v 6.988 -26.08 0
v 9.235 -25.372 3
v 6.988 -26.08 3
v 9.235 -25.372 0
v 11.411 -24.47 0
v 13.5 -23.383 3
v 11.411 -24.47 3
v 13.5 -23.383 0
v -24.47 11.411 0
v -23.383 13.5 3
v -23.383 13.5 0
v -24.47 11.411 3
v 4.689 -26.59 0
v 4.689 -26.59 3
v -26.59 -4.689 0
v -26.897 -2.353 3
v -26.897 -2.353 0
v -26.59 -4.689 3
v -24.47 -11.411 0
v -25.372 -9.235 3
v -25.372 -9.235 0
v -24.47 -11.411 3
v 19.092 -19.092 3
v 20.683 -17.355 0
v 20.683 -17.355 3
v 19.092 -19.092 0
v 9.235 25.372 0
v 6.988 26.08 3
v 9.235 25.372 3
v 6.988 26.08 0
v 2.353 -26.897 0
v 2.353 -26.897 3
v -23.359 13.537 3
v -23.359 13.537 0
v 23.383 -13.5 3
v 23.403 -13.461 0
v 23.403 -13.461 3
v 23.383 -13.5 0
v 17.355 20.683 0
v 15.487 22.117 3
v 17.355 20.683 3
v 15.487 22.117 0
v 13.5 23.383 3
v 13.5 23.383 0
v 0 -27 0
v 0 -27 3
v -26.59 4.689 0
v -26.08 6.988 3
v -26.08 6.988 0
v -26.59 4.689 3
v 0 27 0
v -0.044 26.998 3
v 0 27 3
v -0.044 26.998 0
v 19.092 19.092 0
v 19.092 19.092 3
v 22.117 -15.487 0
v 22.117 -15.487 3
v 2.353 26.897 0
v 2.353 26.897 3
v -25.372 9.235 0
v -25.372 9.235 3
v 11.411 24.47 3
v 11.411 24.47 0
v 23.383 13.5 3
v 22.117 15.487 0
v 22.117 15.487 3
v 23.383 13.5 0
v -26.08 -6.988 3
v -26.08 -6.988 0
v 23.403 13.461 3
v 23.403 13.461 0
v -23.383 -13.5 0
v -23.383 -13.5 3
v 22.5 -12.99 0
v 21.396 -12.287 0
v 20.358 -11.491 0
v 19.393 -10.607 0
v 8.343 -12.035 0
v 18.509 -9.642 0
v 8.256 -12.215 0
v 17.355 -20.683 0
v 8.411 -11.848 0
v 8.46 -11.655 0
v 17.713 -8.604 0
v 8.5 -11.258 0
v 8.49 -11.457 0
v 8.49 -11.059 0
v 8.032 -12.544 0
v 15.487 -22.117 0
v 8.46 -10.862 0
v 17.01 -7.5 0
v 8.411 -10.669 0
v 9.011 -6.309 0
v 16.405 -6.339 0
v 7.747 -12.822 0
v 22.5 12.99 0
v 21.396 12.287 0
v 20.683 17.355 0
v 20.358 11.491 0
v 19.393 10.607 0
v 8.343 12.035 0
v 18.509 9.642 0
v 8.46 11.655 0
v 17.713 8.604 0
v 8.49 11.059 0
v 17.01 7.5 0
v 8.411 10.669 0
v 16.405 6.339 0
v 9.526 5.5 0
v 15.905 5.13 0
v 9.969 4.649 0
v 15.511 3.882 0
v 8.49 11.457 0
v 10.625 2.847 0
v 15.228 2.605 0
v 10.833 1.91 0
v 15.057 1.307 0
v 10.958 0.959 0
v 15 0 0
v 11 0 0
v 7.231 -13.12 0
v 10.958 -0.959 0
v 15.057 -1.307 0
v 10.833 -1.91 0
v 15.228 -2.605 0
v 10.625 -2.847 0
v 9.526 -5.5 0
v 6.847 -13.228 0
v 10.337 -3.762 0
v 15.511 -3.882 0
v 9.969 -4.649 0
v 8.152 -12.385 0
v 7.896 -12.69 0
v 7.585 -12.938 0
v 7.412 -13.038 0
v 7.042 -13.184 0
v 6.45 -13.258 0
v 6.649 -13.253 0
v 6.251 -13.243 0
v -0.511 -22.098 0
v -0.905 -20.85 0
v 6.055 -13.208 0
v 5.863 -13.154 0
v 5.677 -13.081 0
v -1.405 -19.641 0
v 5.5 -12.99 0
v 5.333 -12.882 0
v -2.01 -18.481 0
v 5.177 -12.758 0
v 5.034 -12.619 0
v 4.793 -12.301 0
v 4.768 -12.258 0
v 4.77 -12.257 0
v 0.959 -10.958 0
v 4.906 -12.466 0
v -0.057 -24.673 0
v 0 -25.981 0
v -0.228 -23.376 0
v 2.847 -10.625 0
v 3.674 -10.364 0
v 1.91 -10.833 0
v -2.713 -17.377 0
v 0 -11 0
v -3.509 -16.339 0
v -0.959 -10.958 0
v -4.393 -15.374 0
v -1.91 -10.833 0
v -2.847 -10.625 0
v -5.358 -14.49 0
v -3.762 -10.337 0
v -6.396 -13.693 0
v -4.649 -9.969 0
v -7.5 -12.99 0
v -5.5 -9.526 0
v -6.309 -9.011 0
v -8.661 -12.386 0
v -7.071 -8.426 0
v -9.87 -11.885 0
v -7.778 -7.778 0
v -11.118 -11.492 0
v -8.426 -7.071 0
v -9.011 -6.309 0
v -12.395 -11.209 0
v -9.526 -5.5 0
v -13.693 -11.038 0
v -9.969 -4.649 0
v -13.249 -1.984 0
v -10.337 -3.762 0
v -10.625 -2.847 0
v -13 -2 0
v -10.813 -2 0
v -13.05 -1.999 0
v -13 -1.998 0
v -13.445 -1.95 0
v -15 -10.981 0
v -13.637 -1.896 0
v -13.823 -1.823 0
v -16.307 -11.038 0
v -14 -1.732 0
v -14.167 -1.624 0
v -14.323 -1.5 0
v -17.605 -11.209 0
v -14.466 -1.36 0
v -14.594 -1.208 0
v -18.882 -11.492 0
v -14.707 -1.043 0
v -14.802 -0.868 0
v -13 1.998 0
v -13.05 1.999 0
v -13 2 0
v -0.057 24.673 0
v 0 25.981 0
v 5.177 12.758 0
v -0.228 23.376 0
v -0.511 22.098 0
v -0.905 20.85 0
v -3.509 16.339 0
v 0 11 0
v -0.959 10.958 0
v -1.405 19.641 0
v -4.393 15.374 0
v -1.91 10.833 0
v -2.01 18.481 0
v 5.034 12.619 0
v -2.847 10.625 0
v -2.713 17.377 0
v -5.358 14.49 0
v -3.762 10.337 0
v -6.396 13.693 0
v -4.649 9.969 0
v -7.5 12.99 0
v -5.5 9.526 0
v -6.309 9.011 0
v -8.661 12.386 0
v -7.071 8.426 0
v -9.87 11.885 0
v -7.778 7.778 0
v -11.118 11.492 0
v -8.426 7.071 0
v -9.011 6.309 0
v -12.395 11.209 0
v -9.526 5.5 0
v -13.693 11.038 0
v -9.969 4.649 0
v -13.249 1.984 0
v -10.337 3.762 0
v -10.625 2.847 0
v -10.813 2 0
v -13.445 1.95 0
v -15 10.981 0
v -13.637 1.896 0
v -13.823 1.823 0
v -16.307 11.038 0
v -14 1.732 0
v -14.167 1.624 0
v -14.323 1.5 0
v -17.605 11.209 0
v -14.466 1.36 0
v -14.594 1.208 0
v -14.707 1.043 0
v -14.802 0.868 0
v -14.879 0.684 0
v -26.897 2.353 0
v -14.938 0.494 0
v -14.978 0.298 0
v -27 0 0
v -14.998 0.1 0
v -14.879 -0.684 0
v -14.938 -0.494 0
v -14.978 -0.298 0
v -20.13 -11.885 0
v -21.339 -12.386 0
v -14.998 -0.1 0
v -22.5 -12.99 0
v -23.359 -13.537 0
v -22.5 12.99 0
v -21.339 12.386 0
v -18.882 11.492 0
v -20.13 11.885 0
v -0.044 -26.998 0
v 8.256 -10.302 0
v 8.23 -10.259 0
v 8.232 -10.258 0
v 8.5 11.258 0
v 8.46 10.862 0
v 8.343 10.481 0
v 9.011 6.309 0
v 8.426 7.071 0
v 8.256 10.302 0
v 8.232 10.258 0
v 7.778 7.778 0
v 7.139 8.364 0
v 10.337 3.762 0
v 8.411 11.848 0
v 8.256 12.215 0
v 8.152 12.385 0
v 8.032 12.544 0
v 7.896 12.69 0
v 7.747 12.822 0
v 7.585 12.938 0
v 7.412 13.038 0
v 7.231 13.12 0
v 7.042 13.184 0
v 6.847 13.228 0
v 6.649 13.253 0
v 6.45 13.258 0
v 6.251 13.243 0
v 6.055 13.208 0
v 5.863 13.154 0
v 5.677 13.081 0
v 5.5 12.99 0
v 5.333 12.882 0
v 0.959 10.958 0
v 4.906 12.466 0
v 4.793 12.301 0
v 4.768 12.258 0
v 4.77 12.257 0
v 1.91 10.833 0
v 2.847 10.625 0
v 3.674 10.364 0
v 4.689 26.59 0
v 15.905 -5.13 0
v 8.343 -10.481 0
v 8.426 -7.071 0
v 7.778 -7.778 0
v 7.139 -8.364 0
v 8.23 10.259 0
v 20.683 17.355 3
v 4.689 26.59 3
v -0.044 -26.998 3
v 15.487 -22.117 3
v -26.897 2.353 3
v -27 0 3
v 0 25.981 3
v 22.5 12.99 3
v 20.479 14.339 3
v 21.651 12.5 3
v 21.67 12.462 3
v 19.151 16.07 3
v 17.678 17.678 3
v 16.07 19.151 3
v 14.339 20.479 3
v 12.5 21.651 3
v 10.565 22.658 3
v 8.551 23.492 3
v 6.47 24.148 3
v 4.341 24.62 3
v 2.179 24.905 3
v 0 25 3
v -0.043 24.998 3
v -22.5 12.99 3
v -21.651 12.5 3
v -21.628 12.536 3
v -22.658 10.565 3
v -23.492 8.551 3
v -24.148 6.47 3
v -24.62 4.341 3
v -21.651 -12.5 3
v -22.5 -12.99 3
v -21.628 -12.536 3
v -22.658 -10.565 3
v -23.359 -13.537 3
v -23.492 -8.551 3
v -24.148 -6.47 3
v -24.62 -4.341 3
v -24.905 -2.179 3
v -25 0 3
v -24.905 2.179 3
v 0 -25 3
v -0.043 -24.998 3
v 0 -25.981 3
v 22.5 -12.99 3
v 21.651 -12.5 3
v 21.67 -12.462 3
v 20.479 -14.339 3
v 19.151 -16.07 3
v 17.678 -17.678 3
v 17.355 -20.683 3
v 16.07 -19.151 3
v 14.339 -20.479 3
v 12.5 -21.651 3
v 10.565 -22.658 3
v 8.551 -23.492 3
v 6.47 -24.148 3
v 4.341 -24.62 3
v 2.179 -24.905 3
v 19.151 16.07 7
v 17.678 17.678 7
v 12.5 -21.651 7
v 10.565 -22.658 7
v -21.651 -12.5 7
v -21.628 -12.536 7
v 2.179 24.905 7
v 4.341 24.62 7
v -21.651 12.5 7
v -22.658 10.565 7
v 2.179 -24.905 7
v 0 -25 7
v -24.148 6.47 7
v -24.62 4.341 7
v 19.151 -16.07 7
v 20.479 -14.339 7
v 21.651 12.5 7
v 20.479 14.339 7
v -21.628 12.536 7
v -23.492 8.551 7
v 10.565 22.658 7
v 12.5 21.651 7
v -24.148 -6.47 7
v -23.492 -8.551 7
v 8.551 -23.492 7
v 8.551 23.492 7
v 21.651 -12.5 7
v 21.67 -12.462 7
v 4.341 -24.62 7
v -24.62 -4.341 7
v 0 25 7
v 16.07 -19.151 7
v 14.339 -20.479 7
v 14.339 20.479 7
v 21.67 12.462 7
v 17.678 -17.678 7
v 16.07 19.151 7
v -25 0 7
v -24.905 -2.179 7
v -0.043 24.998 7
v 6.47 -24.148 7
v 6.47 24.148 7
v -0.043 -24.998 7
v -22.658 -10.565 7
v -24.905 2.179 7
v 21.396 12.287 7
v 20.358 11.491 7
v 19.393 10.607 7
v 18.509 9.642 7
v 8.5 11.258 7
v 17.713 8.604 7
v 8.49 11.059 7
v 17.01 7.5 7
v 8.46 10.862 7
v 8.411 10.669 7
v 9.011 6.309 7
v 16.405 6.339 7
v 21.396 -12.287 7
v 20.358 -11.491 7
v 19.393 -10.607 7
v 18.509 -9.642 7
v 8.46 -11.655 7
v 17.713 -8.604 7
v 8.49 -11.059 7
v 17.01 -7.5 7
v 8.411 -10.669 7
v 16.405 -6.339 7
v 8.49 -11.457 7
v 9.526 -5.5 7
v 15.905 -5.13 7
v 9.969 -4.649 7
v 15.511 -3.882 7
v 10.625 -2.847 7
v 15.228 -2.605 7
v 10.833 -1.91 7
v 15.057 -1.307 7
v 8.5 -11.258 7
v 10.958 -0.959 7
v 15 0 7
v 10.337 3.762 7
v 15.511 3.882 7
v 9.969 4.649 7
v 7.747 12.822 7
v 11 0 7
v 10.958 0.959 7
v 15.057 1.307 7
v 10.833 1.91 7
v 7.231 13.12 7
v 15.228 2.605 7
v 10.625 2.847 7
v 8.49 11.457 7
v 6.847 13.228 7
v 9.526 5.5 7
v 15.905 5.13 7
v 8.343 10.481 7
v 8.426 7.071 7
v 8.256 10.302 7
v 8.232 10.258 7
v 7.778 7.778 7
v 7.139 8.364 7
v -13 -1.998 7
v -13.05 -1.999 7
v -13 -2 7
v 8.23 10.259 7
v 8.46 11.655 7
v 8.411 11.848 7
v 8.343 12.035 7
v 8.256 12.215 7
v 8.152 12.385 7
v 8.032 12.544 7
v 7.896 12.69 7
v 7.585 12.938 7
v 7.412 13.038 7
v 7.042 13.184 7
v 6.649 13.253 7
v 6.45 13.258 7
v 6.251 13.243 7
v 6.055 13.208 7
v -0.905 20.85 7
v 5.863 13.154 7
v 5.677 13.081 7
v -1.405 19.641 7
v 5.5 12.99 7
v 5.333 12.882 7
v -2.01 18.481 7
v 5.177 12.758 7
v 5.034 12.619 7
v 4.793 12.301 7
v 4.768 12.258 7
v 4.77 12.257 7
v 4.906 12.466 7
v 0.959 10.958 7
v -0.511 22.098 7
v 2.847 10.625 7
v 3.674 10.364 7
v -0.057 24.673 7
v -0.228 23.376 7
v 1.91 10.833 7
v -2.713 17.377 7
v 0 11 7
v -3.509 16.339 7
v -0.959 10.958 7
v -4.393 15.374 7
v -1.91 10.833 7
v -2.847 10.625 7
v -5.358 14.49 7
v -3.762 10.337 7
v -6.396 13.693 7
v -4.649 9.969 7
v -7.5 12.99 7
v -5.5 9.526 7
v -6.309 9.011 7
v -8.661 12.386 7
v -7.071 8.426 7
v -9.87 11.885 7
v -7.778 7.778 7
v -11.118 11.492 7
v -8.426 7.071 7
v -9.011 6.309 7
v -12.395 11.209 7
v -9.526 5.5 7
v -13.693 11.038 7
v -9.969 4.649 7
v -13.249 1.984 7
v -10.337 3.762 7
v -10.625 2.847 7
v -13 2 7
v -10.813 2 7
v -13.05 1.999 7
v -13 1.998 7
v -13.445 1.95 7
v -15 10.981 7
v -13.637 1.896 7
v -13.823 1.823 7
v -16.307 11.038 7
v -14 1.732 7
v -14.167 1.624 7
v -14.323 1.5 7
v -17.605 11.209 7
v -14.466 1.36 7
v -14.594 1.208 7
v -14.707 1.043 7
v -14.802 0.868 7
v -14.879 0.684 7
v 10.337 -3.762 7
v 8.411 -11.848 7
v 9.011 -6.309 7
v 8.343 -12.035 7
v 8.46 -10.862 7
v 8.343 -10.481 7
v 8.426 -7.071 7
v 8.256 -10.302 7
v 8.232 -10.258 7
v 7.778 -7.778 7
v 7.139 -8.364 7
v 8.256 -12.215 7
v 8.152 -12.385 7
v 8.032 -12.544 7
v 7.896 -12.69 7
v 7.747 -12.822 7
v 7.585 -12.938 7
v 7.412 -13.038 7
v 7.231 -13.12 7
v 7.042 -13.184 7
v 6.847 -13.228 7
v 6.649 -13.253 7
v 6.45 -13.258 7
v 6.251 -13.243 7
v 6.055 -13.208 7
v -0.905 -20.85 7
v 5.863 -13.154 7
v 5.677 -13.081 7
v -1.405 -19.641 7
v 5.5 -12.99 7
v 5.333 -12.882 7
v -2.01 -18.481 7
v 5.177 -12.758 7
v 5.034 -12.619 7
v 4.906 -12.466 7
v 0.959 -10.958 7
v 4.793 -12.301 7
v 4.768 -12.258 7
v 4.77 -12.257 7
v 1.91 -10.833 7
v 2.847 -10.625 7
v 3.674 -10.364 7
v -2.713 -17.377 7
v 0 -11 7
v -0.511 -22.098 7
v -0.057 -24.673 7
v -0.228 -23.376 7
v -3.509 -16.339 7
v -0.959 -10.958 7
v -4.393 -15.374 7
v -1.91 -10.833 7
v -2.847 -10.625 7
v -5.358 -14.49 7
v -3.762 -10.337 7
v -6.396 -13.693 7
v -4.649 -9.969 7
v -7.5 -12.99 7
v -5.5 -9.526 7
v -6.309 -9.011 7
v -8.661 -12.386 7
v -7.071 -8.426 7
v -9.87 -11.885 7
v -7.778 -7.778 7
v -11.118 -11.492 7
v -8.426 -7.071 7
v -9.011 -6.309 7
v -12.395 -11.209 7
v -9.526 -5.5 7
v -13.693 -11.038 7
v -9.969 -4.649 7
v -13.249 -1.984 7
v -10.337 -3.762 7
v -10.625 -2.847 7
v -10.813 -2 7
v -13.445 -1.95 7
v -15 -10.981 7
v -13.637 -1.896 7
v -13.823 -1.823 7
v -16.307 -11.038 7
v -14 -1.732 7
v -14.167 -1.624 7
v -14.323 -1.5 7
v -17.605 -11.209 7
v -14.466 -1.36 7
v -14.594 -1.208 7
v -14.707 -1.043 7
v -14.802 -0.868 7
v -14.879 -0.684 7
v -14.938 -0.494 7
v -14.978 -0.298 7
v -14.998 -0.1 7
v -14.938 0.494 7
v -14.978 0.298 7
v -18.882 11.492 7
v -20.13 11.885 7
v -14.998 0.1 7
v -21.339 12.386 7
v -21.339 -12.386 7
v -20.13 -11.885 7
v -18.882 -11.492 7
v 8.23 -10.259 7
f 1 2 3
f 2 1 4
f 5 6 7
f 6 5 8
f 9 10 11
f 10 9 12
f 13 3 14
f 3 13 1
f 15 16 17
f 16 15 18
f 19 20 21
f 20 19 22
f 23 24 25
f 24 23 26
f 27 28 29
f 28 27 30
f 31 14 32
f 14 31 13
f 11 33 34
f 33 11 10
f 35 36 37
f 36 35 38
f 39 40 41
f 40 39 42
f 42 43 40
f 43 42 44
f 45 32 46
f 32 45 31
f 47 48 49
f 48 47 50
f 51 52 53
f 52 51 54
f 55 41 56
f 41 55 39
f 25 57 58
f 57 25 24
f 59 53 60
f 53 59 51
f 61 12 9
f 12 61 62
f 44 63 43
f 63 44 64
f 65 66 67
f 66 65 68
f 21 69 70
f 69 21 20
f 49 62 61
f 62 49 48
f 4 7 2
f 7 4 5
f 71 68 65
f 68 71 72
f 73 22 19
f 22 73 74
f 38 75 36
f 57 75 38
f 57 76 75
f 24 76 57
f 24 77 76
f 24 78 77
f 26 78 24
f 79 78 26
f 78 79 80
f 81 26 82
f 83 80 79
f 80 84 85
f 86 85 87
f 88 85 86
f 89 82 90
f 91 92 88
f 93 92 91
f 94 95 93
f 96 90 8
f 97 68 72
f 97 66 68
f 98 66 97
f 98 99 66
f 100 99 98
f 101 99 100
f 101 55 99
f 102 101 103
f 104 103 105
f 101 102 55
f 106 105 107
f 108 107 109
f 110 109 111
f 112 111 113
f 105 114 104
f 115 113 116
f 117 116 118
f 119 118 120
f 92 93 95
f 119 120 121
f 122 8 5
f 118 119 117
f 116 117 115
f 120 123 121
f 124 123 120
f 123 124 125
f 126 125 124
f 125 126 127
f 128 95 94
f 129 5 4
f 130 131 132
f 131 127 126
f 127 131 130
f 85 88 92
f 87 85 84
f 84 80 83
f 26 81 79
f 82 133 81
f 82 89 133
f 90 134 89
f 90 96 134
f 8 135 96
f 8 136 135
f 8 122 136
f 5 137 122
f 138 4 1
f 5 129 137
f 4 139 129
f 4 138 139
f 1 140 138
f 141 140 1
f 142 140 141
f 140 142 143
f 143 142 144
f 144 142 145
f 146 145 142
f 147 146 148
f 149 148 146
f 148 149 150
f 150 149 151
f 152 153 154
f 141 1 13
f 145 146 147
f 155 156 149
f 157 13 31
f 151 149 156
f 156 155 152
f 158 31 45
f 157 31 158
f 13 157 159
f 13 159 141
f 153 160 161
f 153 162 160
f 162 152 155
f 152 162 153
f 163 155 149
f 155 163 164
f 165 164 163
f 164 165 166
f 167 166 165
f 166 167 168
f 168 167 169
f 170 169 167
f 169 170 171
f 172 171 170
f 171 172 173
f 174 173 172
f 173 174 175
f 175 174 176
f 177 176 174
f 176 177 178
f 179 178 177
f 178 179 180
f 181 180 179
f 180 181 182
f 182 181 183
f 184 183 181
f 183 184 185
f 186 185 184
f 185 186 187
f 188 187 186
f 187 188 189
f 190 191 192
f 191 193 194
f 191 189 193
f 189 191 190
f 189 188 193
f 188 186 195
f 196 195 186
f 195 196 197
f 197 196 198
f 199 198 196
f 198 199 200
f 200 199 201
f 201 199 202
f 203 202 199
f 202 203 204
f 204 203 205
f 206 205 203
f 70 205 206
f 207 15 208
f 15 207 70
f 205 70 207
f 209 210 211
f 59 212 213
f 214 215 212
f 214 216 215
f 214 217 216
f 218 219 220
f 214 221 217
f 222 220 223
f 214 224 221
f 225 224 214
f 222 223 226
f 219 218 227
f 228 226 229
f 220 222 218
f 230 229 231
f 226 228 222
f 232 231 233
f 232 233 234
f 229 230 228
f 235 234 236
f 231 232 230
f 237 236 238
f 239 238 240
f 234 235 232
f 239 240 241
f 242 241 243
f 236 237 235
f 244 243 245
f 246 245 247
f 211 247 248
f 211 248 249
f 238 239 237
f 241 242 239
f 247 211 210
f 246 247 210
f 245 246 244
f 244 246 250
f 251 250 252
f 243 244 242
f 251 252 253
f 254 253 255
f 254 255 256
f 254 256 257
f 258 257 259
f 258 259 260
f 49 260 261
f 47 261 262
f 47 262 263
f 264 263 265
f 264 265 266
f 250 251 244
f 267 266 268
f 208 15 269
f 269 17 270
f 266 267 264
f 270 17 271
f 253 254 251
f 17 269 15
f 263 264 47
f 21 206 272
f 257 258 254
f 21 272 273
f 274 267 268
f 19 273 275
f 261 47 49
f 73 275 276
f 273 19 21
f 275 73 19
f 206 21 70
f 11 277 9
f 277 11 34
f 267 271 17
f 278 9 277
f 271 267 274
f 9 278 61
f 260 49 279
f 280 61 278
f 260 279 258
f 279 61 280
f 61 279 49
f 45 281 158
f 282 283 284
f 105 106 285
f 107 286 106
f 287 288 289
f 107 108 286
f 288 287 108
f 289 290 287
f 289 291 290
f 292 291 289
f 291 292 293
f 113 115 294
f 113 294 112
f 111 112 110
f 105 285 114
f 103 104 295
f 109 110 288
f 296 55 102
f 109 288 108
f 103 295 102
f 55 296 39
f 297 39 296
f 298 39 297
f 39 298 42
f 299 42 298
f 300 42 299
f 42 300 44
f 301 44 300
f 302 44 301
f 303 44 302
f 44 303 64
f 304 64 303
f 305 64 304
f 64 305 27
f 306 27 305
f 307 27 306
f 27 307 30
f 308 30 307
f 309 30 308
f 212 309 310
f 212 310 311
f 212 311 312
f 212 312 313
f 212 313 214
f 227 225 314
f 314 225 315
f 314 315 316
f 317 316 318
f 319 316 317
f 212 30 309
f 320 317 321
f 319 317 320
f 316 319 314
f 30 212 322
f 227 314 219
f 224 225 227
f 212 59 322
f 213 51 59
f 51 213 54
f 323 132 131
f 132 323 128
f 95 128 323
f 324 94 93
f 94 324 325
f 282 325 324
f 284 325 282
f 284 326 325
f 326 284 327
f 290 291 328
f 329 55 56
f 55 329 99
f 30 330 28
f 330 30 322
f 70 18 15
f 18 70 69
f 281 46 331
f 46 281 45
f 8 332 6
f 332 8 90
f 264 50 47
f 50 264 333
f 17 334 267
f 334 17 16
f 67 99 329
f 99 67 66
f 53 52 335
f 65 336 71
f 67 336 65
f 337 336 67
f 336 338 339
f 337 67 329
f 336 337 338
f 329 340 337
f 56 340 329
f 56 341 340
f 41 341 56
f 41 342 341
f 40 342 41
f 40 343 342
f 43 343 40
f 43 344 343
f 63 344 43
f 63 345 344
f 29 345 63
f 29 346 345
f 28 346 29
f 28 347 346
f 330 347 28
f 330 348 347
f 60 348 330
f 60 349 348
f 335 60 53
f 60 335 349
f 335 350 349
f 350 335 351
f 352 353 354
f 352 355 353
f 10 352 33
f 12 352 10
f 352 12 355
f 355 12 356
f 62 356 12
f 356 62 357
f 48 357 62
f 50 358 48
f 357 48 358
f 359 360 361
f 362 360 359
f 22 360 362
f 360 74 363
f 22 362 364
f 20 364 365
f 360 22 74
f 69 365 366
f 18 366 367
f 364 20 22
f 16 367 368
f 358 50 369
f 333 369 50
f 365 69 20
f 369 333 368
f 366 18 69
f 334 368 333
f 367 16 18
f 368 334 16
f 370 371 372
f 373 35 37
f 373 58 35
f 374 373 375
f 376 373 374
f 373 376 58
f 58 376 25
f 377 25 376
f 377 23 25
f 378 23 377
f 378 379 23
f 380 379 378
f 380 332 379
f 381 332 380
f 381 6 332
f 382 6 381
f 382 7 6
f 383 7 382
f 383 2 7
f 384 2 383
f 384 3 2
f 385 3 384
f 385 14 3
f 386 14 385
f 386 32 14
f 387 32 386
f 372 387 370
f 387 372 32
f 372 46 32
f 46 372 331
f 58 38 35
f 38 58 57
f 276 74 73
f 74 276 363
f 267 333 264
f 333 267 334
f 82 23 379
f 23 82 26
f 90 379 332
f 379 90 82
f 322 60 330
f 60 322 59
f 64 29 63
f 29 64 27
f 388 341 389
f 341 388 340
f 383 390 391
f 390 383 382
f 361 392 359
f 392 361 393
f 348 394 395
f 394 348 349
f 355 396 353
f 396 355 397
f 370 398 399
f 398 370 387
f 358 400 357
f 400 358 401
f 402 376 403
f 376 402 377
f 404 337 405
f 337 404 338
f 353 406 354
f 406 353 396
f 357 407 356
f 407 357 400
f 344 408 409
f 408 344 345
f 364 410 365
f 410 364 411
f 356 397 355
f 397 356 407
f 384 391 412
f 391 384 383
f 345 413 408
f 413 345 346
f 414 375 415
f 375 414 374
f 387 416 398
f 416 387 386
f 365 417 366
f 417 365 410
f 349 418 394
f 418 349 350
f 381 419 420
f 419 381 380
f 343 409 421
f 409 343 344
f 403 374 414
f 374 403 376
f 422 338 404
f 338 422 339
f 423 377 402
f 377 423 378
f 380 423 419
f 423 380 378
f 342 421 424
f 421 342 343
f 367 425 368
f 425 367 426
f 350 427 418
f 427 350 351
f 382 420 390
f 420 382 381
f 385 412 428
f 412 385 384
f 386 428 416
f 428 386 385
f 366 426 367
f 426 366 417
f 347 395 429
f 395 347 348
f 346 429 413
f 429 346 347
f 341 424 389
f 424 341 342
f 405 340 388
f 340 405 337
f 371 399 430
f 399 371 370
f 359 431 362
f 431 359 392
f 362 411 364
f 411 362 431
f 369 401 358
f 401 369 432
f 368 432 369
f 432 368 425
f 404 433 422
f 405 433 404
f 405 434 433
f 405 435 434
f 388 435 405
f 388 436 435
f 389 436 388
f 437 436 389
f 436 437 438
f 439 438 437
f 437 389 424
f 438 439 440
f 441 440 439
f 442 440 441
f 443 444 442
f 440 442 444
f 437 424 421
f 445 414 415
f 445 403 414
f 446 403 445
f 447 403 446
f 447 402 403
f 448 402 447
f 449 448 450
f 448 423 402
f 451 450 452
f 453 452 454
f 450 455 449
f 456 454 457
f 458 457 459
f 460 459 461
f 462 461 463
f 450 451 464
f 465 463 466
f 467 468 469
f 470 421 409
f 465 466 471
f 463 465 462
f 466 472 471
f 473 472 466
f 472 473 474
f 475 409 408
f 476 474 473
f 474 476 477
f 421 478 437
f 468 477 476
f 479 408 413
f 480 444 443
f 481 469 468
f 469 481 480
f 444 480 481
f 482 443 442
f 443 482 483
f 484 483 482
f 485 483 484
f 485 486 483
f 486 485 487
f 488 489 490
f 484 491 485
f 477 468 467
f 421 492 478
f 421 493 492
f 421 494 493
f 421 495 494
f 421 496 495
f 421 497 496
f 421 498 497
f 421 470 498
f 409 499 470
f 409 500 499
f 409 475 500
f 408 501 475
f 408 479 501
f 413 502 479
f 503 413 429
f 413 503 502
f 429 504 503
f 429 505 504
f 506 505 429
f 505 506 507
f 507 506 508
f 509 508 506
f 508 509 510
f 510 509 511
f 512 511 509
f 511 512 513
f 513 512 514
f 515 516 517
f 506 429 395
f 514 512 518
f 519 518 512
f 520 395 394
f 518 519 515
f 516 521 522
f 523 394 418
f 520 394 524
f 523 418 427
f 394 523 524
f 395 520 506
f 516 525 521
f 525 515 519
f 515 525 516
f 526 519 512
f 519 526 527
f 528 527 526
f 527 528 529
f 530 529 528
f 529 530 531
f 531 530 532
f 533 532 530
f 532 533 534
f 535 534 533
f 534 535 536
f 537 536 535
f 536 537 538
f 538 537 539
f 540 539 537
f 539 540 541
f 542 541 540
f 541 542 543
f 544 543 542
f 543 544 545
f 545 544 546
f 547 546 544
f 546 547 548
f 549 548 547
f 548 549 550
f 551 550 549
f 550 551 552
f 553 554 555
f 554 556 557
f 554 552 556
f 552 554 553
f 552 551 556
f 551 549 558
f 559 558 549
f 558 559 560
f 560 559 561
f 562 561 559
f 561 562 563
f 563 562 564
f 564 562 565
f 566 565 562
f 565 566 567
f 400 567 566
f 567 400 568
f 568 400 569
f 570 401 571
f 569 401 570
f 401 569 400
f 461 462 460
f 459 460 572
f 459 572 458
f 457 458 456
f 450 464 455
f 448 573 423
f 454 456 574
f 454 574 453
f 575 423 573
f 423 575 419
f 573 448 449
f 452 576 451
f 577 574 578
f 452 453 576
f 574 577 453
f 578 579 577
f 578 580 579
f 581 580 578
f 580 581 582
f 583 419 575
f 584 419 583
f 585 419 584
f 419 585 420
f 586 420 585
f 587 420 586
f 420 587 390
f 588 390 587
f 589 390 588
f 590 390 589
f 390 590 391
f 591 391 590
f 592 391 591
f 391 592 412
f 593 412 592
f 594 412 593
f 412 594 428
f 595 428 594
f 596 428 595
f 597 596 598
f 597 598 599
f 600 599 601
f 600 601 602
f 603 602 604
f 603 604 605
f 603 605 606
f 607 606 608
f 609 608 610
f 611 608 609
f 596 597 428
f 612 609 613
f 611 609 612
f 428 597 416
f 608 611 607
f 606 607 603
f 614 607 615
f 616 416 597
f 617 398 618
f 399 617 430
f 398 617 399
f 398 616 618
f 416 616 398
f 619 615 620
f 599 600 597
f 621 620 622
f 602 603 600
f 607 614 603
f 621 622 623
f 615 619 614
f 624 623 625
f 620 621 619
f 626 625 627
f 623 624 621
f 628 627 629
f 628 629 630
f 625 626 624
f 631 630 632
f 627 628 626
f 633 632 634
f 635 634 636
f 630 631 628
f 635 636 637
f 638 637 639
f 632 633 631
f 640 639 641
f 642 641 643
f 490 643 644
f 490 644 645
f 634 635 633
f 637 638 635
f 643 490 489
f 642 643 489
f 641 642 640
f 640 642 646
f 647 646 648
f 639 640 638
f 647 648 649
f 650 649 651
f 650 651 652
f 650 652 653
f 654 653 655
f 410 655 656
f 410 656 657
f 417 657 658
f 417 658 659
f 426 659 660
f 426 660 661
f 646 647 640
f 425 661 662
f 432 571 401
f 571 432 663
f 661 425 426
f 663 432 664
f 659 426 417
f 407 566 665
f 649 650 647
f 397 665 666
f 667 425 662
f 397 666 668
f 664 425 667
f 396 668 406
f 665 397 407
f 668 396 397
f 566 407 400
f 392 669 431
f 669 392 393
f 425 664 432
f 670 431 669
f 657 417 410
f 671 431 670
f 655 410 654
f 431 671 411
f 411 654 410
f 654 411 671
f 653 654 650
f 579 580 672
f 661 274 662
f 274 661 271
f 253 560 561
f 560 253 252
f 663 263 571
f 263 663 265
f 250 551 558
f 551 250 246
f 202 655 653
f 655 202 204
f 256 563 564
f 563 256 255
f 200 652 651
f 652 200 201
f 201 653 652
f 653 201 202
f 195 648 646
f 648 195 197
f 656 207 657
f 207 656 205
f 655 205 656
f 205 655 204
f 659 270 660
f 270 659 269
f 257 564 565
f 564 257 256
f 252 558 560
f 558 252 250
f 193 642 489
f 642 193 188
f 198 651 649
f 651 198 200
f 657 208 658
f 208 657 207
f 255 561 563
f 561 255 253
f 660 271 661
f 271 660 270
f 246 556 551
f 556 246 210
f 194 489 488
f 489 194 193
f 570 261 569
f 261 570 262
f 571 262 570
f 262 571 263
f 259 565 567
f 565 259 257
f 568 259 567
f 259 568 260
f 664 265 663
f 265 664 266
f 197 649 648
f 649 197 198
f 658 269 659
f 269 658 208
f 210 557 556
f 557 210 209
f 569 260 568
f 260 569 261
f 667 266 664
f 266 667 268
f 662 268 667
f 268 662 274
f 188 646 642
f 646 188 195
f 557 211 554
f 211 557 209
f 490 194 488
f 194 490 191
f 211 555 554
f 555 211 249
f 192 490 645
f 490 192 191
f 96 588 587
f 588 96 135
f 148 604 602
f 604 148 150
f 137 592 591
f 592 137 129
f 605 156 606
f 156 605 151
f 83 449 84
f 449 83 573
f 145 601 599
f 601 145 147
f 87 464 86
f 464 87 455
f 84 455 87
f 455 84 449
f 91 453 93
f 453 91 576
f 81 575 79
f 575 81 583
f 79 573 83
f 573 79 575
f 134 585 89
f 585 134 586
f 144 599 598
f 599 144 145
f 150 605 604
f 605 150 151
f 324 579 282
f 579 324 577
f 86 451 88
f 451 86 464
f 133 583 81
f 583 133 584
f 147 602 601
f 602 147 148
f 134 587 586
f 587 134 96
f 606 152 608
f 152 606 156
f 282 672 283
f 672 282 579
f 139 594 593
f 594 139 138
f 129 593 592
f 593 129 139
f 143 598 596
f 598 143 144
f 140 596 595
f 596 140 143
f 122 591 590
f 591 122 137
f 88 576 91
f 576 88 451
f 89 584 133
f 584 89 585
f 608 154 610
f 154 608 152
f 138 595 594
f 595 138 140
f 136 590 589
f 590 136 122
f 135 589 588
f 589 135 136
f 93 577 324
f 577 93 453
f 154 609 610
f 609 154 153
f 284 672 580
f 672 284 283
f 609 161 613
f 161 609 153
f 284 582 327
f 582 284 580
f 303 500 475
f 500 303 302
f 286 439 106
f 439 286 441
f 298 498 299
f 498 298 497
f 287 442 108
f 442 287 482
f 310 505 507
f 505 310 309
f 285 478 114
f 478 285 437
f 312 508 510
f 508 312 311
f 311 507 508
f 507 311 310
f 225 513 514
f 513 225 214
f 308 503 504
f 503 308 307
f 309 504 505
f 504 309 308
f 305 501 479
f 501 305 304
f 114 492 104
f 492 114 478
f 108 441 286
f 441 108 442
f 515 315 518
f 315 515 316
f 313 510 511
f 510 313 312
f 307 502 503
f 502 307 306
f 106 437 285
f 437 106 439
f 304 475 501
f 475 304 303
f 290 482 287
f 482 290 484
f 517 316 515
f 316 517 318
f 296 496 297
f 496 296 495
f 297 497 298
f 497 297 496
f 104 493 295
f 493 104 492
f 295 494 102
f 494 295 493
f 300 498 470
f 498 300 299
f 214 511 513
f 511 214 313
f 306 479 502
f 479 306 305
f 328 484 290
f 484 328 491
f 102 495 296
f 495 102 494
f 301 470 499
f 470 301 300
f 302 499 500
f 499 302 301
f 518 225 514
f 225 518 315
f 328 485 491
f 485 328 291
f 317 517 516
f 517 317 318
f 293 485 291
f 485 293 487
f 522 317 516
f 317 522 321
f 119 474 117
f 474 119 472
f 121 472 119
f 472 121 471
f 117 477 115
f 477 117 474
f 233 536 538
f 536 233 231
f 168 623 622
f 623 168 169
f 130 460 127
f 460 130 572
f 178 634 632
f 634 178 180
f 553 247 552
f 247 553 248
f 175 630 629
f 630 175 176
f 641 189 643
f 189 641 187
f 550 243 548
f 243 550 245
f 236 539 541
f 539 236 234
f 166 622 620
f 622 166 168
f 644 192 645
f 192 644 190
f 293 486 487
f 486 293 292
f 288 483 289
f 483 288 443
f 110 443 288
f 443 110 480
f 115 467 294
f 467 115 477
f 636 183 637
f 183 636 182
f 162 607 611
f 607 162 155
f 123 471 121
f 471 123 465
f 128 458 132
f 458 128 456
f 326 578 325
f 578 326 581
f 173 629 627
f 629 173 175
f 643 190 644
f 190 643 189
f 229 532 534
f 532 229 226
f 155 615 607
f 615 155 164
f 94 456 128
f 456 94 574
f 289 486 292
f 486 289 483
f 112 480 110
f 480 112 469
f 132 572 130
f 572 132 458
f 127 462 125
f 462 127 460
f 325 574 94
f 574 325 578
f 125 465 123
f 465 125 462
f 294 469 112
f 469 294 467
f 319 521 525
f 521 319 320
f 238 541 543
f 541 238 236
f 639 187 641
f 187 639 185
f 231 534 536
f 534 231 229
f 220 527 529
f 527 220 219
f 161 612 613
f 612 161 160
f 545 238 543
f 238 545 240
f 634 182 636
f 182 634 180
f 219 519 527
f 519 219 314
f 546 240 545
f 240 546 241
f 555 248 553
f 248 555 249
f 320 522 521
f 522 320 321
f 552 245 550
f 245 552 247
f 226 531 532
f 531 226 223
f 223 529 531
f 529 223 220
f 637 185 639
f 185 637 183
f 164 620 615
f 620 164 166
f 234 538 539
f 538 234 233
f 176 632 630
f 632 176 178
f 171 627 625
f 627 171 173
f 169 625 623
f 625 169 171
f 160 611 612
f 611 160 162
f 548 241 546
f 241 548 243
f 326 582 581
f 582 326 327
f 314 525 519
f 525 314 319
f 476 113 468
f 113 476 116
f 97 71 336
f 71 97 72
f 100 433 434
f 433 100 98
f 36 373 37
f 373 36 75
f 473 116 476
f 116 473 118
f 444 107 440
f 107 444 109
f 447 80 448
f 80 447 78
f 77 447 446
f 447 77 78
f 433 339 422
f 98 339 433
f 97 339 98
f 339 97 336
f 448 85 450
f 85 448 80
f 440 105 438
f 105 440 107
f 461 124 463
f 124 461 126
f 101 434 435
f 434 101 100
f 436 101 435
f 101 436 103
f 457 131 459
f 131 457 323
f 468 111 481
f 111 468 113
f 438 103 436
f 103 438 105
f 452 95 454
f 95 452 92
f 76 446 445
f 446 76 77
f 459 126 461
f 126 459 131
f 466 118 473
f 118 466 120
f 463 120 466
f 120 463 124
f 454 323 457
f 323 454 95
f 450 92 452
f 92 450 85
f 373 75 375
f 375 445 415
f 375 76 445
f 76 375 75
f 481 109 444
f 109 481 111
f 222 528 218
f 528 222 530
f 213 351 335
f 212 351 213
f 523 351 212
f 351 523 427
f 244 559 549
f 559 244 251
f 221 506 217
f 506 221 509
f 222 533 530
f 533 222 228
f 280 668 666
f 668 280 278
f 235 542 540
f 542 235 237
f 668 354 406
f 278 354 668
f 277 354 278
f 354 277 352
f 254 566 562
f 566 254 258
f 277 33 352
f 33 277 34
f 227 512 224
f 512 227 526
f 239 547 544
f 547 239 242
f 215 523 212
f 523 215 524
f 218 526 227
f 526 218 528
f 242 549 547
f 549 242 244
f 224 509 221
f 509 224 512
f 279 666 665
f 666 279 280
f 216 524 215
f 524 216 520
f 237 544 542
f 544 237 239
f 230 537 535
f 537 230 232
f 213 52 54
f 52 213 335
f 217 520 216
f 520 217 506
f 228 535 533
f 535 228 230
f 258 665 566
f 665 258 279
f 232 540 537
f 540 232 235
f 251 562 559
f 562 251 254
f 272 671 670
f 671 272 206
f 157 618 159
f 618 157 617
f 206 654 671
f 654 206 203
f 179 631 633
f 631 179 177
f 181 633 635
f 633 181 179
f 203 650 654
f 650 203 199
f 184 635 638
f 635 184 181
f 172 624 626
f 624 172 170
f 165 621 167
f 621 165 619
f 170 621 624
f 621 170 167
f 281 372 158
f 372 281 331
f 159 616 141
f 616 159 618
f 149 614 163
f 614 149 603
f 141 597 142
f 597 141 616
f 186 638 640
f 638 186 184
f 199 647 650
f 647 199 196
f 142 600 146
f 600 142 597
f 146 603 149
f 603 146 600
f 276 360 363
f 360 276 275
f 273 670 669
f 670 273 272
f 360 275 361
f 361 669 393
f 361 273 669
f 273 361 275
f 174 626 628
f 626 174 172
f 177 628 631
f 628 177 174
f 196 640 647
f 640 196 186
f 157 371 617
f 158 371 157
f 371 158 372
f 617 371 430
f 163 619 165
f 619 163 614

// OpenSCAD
radius = 50/2;

$fs = 0.2;
$fa = 5;

module spoolholder (radius=25)
{
	difference ()
	{
		union ()
		{
			cylinder(r=radius+2, h=3);
			translate ([0,0,3]) cylinder(r=radius, h=4);
		}
		translate([0,0,-1]) 608hole();
		circleholes (3, 30, 30);
	}
}

module circleholes (number=6, diameter=6, distance=20)
{
	for(i = [0 : number])
	{
		rotate(a = (i*(360/number)), v = [0, 0, 1]) translate ([distance, 0, -1]) cylinder(r = diameter/2, h = 9);
	}

}

module 608hole (height=9)
{
	module chunk (height=9)
	{
			cylinder(r=2, h=height);	
			translate ([0, -2, 0]) cube([4, 4, height]);
	}
	cylinder(r=11, h=height);
	translate ([-13,0,0]) chunk();
	rotate (120, [0,0,1]) translate ([-13,0,0]) chunk();
	rotate (240, [0,0,1]) translate ([-13,0,0]) chunk();
}

spoolholder(radius);
